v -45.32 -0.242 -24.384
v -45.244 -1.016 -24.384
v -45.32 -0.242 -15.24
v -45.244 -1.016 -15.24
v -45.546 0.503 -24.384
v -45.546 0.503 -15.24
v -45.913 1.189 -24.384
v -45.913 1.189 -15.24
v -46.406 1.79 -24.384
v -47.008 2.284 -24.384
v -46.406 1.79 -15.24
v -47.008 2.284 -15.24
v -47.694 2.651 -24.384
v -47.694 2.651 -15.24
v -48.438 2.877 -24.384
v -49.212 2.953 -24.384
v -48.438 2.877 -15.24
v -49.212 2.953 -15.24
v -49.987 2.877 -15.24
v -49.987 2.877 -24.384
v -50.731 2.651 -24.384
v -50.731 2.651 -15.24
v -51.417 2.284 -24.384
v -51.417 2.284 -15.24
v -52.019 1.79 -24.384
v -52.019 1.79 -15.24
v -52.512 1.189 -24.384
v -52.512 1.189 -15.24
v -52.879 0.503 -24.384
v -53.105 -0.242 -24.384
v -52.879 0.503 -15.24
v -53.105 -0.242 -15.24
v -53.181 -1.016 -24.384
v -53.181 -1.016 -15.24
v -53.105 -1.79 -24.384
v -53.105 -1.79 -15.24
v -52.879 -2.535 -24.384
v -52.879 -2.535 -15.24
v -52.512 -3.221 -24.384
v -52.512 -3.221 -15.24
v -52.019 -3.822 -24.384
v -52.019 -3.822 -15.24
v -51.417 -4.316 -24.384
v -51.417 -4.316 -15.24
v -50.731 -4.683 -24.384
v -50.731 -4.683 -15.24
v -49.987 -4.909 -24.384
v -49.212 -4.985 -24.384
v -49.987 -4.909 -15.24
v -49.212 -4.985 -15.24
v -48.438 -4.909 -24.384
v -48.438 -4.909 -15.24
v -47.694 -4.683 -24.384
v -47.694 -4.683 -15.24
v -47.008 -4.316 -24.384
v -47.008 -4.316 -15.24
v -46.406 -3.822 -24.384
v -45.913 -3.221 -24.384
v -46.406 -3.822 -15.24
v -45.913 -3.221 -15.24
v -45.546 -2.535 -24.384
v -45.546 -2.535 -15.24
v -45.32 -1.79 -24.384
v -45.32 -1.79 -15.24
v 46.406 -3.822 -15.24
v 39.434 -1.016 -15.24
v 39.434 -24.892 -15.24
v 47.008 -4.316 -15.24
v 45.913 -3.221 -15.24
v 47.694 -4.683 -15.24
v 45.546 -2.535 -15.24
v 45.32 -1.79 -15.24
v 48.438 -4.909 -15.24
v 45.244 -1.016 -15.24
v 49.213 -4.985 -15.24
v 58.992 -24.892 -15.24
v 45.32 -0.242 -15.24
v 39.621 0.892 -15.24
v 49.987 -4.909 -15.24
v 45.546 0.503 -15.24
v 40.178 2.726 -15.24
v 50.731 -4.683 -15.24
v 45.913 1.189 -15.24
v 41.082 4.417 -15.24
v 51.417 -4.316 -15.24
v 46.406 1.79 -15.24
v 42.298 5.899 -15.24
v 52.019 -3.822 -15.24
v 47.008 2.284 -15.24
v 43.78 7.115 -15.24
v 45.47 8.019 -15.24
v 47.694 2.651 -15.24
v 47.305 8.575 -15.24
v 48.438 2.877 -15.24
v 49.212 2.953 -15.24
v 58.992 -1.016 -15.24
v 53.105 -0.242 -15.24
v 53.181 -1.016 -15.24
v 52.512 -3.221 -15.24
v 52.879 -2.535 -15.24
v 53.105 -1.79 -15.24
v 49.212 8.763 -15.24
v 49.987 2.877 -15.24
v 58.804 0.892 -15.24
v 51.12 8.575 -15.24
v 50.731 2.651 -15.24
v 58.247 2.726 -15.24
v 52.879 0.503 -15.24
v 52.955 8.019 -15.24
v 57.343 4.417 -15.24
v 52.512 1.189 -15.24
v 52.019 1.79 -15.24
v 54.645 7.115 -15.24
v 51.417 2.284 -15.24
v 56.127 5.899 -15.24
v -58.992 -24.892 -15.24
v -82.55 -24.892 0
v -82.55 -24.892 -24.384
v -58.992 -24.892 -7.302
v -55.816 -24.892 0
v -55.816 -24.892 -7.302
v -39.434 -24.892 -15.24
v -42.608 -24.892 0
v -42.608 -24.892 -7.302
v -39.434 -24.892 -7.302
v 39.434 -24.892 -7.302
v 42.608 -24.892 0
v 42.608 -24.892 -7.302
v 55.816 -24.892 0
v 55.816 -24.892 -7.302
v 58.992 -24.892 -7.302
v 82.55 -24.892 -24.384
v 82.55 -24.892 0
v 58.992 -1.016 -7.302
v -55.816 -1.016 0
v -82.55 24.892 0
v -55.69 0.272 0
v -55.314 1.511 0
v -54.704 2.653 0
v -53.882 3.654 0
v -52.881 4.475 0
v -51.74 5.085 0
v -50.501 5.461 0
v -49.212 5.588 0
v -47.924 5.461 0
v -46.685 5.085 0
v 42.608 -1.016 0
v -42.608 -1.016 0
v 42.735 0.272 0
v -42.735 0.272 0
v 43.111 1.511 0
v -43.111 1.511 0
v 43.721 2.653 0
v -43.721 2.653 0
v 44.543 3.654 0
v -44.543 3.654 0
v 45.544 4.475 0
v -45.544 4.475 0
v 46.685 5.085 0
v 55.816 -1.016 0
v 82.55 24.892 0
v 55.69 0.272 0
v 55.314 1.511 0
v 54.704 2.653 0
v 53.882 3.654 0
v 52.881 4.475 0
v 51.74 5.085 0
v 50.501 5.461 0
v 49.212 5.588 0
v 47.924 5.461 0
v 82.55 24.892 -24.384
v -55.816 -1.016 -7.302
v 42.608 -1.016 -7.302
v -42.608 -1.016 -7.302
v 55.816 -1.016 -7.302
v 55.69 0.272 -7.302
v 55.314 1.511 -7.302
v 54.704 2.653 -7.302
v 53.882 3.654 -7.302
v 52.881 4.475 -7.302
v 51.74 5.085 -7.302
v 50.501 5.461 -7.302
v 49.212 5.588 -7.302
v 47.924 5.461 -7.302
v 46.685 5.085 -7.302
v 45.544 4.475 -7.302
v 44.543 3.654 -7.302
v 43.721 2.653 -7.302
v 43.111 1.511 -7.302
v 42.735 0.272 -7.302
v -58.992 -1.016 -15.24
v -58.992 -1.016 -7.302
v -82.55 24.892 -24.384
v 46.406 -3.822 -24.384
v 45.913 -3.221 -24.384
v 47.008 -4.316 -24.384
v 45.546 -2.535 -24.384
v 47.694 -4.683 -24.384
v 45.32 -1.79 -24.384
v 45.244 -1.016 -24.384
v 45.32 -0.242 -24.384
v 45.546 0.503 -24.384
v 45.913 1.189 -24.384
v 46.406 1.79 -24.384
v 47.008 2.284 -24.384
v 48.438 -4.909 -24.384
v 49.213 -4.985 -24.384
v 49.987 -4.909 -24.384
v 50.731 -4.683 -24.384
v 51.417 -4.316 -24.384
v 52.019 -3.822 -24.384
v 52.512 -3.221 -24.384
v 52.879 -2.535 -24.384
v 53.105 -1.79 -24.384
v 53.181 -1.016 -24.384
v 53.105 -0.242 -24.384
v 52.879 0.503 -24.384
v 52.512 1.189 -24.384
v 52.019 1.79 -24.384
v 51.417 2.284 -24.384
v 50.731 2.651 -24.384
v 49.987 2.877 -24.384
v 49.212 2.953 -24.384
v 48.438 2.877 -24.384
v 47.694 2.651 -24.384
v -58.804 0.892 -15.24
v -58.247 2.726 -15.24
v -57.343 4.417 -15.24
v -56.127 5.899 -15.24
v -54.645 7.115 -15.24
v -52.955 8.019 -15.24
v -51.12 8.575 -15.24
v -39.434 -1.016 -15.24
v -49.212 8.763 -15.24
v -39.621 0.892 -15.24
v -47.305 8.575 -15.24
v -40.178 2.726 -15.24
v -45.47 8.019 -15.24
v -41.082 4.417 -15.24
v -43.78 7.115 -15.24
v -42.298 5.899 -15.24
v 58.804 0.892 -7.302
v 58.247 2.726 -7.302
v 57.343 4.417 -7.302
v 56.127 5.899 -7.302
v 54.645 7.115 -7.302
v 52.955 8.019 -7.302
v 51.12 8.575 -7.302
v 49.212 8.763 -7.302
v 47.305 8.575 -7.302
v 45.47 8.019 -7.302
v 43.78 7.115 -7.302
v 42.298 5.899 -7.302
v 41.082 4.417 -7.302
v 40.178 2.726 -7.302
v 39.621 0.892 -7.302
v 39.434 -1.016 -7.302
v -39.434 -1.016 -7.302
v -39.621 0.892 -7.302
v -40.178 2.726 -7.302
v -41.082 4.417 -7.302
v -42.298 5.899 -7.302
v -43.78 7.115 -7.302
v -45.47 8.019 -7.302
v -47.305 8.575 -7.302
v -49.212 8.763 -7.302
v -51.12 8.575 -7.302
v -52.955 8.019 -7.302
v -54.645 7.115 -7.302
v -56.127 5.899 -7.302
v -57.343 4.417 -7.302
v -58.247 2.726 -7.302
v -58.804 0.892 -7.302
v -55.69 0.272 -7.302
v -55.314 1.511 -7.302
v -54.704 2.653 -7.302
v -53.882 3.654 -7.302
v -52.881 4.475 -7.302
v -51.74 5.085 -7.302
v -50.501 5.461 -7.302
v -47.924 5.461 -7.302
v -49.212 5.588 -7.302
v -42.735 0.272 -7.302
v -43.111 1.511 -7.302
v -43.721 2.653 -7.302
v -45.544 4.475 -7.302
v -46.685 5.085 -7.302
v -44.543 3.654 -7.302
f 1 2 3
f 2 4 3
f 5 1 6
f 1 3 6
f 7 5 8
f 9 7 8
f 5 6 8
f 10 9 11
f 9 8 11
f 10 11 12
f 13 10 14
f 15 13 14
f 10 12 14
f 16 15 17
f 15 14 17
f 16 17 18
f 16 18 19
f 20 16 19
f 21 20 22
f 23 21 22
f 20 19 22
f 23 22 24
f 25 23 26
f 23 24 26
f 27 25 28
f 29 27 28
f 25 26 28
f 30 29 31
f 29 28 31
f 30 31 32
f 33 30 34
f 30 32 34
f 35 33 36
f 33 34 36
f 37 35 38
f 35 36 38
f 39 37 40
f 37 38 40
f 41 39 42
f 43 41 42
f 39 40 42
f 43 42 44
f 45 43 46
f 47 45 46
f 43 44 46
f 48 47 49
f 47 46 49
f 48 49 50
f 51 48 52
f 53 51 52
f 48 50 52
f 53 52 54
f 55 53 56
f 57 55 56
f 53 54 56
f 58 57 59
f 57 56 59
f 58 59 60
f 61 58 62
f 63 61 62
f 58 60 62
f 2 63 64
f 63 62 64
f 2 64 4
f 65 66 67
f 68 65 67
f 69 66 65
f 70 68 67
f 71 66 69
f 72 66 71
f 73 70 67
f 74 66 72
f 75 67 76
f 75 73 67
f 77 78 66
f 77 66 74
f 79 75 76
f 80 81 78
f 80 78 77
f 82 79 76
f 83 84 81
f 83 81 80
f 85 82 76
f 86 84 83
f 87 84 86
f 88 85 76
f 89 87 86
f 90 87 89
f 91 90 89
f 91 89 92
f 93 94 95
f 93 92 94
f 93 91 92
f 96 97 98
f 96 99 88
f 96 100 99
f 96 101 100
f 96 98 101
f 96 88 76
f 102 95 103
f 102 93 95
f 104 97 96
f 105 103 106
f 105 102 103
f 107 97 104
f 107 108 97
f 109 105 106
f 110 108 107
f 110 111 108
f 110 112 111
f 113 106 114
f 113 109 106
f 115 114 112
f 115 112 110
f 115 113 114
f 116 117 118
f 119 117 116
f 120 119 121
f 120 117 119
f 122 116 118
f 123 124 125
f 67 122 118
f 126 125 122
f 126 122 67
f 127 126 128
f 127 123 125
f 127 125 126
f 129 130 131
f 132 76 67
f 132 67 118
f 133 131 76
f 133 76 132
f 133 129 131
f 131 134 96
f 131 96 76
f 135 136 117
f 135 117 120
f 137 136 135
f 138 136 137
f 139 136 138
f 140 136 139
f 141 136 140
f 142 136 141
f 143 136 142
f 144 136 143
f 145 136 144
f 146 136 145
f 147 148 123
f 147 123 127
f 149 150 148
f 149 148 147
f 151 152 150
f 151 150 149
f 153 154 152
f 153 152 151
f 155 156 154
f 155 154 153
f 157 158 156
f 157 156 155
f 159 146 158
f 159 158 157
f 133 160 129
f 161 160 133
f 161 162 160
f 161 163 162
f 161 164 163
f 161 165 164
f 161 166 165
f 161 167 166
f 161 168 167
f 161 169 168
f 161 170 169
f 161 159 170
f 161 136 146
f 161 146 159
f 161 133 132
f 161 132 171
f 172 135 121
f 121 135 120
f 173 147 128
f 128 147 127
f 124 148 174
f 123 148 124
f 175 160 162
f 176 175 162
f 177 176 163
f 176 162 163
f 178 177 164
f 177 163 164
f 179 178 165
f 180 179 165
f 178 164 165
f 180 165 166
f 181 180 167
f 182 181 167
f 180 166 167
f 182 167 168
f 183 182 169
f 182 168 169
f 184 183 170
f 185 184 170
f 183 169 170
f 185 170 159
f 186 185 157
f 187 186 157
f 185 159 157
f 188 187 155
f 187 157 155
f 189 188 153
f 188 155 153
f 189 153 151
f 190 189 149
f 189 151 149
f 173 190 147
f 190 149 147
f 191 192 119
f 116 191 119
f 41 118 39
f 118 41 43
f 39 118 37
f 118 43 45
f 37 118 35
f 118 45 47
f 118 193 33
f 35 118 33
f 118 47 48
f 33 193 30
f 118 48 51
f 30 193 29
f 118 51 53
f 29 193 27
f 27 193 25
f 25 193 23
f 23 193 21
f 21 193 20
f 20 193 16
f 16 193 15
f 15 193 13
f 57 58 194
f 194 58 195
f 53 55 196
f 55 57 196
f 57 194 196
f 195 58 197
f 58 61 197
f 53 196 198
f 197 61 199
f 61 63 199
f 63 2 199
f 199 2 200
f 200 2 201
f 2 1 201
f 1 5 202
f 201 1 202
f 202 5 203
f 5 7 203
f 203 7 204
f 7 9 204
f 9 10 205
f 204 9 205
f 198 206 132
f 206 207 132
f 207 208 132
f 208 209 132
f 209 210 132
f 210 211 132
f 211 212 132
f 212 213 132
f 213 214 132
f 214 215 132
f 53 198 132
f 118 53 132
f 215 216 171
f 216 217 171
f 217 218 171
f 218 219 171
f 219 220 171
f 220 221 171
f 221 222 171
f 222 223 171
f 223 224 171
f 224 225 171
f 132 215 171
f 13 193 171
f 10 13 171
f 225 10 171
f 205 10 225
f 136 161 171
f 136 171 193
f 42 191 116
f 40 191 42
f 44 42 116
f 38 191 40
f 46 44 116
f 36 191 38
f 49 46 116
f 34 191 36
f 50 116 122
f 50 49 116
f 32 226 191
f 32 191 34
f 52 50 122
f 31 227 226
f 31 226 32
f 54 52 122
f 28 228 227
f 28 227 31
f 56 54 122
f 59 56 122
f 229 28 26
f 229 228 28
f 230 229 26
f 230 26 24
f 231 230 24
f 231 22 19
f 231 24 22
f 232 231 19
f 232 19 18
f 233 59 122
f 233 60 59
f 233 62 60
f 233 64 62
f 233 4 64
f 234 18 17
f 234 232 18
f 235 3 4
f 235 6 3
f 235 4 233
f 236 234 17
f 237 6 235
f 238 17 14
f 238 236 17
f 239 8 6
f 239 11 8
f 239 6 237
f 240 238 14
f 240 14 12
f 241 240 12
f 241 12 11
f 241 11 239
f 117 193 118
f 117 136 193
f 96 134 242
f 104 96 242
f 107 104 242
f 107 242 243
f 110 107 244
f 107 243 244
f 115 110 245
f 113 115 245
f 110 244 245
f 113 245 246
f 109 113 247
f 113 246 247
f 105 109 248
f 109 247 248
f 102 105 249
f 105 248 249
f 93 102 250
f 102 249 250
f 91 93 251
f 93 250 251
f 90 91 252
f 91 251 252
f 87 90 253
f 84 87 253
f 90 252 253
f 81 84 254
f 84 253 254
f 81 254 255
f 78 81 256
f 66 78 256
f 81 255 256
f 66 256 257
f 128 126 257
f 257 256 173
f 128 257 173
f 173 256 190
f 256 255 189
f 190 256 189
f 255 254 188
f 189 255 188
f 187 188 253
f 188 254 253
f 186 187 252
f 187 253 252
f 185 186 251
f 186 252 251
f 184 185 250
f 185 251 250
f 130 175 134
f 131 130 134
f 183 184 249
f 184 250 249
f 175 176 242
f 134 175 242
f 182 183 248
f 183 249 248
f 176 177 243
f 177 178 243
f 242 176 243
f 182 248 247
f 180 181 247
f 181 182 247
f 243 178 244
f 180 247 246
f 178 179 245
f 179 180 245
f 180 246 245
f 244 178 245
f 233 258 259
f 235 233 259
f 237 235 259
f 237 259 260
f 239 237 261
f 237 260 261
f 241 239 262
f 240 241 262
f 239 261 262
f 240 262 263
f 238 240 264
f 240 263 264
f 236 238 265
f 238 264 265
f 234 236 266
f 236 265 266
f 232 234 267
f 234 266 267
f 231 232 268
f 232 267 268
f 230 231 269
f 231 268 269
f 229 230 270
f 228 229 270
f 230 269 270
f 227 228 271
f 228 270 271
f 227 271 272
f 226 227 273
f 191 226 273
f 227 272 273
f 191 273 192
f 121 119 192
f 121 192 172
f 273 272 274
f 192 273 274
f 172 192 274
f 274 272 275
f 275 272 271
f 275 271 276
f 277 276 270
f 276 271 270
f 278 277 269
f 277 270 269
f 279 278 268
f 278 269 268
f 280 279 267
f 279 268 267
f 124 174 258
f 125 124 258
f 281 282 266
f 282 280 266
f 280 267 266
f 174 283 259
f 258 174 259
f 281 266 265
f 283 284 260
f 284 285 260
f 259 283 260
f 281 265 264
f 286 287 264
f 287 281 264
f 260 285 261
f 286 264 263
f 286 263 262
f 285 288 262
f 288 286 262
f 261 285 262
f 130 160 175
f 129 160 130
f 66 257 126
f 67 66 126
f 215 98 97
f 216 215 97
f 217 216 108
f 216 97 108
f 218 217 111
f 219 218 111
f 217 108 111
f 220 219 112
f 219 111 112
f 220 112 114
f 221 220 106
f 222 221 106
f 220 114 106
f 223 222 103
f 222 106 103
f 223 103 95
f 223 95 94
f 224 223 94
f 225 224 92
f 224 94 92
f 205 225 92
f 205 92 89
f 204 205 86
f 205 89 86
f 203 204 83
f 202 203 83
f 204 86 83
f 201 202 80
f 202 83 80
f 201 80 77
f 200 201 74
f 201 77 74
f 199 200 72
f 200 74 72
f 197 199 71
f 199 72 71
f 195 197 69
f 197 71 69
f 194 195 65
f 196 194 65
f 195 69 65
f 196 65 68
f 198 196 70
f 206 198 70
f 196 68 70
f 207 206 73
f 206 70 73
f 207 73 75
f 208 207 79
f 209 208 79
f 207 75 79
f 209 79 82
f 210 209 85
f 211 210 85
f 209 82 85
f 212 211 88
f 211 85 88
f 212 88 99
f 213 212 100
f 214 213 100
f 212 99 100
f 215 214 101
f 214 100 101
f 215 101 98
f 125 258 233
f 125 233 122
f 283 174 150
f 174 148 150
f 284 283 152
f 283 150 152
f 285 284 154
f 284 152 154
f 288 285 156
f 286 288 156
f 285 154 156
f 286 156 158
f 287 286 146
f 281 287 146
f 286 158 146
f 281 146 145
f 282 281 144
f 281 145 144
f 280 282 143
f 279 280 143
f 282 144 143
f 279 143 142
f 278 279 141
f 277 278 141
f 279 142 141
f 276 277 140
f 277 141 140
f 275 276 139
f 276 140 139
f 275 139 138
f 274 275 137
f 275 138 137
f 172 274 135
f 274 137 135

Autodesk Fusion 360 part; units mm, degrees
sketch "Sketch1" plane through (0, 0, 0) normal (0, 0, 1) x (1, 0, 0)
  line L0 (82.55, 24.892) -> (-82.55, 24.892)
  line L1 (-82.55, 24.892) -> (-82.55, -24.892)
  line L2 (-82.55, -24.892) -> (82.55, -24.892)
  line L3 (82.55, -24.892) -> (82.55, 24.892)
  line L4 (82.55, 24.892) -> (-82.55, -24.892) construction
  line L5 (-82.55, 24.892) -> (82.55, -24.892) construction
  circle A0 centre (-49.2125, -1.016) radius 3.9688
  circle A1 centre (49.2125, -1.016) radius 3.9688
  line L6 (-39.4335, -1.016) -> (-39.4335, -24.892)
  line L7 (-58.9915, -1.016) -> (-58.9915, -24.892)
  line L8 (39.4335, -1.016) -> (39.4335, -24.892)
  line L9 (58.9915, -1.016) -> (58.9915, -24.892)
  arc A2 (-39.4335, -1.016) -> (-58.9915, -1.016) centre (-49.2125, -1.016) ccw
  arc A3 (58.9915, -1.016) -> (39.4335, -1.016) centre (49.2125, -1.016) ccw
  line L10 (0, 24.892) -> (0, -24.892) construction
  circle A4 centre (-49.2125, -1.016) radius 6.604
  circle A5 centre (49.2125, -1.016) radius 6.604
  line L11 (-42.6085, -1.016) -> (-42.6085, -24.892)
  line L12 (-55.8165, -1.016) -> (-55.8165, -24.892)
  line L13 (42.6085, -1.016) -> (42.6085, -24.892)
  line L14 (55.8165, -1.016) -> (55.8165, -24.892)
  point P0 (-49.2125, -1.016)
  point P1 (49.2125, -1.016)
  dimension "d1" = 165.1
  dimension "d2" = 49.784
  dimension "d3" = 7.9375
  dimension "d4" = 7.9375
  dimension "d5" = 98.425
  dimension "d9" = 23.876
  dimension "d10" = 19.558
  dimension "d11" = 19.558
  dimension "d16" = 23.876
  dimension "d17" = 49.2125
  dimension "d19" = 13.208
  dimension "d20" = 13.208
extrude "Extrude1" add sketch "Sketch1" against normal blind 24.384
extrude "Extrude2" cut sketch "Sketch1" against normal blind 15.24 contours L2 L8 L9 A3 A5 L13 L14 | L2 L6 L7 A2 A4 L11 L12 | L2 A5 L13 L14 | L2 A4 L11 L12 | A5 | A4
extrude "Extrude3" add sketch "Sketch1" against normal blind 7.3025 contours L2 L8 L9 A3 A5 L13 L14 | L2 L6 L7 A2 A4 L11 L12
equation "d2 = 2 in - 0.04 in"
equation "d4 = d3"
equation "d11 = d10"
equation "d12 = -1 in + 0.04 in"
equation "d17 = ( 3.875 / 2 ) * 1 in"
equation "d20 = d19"
